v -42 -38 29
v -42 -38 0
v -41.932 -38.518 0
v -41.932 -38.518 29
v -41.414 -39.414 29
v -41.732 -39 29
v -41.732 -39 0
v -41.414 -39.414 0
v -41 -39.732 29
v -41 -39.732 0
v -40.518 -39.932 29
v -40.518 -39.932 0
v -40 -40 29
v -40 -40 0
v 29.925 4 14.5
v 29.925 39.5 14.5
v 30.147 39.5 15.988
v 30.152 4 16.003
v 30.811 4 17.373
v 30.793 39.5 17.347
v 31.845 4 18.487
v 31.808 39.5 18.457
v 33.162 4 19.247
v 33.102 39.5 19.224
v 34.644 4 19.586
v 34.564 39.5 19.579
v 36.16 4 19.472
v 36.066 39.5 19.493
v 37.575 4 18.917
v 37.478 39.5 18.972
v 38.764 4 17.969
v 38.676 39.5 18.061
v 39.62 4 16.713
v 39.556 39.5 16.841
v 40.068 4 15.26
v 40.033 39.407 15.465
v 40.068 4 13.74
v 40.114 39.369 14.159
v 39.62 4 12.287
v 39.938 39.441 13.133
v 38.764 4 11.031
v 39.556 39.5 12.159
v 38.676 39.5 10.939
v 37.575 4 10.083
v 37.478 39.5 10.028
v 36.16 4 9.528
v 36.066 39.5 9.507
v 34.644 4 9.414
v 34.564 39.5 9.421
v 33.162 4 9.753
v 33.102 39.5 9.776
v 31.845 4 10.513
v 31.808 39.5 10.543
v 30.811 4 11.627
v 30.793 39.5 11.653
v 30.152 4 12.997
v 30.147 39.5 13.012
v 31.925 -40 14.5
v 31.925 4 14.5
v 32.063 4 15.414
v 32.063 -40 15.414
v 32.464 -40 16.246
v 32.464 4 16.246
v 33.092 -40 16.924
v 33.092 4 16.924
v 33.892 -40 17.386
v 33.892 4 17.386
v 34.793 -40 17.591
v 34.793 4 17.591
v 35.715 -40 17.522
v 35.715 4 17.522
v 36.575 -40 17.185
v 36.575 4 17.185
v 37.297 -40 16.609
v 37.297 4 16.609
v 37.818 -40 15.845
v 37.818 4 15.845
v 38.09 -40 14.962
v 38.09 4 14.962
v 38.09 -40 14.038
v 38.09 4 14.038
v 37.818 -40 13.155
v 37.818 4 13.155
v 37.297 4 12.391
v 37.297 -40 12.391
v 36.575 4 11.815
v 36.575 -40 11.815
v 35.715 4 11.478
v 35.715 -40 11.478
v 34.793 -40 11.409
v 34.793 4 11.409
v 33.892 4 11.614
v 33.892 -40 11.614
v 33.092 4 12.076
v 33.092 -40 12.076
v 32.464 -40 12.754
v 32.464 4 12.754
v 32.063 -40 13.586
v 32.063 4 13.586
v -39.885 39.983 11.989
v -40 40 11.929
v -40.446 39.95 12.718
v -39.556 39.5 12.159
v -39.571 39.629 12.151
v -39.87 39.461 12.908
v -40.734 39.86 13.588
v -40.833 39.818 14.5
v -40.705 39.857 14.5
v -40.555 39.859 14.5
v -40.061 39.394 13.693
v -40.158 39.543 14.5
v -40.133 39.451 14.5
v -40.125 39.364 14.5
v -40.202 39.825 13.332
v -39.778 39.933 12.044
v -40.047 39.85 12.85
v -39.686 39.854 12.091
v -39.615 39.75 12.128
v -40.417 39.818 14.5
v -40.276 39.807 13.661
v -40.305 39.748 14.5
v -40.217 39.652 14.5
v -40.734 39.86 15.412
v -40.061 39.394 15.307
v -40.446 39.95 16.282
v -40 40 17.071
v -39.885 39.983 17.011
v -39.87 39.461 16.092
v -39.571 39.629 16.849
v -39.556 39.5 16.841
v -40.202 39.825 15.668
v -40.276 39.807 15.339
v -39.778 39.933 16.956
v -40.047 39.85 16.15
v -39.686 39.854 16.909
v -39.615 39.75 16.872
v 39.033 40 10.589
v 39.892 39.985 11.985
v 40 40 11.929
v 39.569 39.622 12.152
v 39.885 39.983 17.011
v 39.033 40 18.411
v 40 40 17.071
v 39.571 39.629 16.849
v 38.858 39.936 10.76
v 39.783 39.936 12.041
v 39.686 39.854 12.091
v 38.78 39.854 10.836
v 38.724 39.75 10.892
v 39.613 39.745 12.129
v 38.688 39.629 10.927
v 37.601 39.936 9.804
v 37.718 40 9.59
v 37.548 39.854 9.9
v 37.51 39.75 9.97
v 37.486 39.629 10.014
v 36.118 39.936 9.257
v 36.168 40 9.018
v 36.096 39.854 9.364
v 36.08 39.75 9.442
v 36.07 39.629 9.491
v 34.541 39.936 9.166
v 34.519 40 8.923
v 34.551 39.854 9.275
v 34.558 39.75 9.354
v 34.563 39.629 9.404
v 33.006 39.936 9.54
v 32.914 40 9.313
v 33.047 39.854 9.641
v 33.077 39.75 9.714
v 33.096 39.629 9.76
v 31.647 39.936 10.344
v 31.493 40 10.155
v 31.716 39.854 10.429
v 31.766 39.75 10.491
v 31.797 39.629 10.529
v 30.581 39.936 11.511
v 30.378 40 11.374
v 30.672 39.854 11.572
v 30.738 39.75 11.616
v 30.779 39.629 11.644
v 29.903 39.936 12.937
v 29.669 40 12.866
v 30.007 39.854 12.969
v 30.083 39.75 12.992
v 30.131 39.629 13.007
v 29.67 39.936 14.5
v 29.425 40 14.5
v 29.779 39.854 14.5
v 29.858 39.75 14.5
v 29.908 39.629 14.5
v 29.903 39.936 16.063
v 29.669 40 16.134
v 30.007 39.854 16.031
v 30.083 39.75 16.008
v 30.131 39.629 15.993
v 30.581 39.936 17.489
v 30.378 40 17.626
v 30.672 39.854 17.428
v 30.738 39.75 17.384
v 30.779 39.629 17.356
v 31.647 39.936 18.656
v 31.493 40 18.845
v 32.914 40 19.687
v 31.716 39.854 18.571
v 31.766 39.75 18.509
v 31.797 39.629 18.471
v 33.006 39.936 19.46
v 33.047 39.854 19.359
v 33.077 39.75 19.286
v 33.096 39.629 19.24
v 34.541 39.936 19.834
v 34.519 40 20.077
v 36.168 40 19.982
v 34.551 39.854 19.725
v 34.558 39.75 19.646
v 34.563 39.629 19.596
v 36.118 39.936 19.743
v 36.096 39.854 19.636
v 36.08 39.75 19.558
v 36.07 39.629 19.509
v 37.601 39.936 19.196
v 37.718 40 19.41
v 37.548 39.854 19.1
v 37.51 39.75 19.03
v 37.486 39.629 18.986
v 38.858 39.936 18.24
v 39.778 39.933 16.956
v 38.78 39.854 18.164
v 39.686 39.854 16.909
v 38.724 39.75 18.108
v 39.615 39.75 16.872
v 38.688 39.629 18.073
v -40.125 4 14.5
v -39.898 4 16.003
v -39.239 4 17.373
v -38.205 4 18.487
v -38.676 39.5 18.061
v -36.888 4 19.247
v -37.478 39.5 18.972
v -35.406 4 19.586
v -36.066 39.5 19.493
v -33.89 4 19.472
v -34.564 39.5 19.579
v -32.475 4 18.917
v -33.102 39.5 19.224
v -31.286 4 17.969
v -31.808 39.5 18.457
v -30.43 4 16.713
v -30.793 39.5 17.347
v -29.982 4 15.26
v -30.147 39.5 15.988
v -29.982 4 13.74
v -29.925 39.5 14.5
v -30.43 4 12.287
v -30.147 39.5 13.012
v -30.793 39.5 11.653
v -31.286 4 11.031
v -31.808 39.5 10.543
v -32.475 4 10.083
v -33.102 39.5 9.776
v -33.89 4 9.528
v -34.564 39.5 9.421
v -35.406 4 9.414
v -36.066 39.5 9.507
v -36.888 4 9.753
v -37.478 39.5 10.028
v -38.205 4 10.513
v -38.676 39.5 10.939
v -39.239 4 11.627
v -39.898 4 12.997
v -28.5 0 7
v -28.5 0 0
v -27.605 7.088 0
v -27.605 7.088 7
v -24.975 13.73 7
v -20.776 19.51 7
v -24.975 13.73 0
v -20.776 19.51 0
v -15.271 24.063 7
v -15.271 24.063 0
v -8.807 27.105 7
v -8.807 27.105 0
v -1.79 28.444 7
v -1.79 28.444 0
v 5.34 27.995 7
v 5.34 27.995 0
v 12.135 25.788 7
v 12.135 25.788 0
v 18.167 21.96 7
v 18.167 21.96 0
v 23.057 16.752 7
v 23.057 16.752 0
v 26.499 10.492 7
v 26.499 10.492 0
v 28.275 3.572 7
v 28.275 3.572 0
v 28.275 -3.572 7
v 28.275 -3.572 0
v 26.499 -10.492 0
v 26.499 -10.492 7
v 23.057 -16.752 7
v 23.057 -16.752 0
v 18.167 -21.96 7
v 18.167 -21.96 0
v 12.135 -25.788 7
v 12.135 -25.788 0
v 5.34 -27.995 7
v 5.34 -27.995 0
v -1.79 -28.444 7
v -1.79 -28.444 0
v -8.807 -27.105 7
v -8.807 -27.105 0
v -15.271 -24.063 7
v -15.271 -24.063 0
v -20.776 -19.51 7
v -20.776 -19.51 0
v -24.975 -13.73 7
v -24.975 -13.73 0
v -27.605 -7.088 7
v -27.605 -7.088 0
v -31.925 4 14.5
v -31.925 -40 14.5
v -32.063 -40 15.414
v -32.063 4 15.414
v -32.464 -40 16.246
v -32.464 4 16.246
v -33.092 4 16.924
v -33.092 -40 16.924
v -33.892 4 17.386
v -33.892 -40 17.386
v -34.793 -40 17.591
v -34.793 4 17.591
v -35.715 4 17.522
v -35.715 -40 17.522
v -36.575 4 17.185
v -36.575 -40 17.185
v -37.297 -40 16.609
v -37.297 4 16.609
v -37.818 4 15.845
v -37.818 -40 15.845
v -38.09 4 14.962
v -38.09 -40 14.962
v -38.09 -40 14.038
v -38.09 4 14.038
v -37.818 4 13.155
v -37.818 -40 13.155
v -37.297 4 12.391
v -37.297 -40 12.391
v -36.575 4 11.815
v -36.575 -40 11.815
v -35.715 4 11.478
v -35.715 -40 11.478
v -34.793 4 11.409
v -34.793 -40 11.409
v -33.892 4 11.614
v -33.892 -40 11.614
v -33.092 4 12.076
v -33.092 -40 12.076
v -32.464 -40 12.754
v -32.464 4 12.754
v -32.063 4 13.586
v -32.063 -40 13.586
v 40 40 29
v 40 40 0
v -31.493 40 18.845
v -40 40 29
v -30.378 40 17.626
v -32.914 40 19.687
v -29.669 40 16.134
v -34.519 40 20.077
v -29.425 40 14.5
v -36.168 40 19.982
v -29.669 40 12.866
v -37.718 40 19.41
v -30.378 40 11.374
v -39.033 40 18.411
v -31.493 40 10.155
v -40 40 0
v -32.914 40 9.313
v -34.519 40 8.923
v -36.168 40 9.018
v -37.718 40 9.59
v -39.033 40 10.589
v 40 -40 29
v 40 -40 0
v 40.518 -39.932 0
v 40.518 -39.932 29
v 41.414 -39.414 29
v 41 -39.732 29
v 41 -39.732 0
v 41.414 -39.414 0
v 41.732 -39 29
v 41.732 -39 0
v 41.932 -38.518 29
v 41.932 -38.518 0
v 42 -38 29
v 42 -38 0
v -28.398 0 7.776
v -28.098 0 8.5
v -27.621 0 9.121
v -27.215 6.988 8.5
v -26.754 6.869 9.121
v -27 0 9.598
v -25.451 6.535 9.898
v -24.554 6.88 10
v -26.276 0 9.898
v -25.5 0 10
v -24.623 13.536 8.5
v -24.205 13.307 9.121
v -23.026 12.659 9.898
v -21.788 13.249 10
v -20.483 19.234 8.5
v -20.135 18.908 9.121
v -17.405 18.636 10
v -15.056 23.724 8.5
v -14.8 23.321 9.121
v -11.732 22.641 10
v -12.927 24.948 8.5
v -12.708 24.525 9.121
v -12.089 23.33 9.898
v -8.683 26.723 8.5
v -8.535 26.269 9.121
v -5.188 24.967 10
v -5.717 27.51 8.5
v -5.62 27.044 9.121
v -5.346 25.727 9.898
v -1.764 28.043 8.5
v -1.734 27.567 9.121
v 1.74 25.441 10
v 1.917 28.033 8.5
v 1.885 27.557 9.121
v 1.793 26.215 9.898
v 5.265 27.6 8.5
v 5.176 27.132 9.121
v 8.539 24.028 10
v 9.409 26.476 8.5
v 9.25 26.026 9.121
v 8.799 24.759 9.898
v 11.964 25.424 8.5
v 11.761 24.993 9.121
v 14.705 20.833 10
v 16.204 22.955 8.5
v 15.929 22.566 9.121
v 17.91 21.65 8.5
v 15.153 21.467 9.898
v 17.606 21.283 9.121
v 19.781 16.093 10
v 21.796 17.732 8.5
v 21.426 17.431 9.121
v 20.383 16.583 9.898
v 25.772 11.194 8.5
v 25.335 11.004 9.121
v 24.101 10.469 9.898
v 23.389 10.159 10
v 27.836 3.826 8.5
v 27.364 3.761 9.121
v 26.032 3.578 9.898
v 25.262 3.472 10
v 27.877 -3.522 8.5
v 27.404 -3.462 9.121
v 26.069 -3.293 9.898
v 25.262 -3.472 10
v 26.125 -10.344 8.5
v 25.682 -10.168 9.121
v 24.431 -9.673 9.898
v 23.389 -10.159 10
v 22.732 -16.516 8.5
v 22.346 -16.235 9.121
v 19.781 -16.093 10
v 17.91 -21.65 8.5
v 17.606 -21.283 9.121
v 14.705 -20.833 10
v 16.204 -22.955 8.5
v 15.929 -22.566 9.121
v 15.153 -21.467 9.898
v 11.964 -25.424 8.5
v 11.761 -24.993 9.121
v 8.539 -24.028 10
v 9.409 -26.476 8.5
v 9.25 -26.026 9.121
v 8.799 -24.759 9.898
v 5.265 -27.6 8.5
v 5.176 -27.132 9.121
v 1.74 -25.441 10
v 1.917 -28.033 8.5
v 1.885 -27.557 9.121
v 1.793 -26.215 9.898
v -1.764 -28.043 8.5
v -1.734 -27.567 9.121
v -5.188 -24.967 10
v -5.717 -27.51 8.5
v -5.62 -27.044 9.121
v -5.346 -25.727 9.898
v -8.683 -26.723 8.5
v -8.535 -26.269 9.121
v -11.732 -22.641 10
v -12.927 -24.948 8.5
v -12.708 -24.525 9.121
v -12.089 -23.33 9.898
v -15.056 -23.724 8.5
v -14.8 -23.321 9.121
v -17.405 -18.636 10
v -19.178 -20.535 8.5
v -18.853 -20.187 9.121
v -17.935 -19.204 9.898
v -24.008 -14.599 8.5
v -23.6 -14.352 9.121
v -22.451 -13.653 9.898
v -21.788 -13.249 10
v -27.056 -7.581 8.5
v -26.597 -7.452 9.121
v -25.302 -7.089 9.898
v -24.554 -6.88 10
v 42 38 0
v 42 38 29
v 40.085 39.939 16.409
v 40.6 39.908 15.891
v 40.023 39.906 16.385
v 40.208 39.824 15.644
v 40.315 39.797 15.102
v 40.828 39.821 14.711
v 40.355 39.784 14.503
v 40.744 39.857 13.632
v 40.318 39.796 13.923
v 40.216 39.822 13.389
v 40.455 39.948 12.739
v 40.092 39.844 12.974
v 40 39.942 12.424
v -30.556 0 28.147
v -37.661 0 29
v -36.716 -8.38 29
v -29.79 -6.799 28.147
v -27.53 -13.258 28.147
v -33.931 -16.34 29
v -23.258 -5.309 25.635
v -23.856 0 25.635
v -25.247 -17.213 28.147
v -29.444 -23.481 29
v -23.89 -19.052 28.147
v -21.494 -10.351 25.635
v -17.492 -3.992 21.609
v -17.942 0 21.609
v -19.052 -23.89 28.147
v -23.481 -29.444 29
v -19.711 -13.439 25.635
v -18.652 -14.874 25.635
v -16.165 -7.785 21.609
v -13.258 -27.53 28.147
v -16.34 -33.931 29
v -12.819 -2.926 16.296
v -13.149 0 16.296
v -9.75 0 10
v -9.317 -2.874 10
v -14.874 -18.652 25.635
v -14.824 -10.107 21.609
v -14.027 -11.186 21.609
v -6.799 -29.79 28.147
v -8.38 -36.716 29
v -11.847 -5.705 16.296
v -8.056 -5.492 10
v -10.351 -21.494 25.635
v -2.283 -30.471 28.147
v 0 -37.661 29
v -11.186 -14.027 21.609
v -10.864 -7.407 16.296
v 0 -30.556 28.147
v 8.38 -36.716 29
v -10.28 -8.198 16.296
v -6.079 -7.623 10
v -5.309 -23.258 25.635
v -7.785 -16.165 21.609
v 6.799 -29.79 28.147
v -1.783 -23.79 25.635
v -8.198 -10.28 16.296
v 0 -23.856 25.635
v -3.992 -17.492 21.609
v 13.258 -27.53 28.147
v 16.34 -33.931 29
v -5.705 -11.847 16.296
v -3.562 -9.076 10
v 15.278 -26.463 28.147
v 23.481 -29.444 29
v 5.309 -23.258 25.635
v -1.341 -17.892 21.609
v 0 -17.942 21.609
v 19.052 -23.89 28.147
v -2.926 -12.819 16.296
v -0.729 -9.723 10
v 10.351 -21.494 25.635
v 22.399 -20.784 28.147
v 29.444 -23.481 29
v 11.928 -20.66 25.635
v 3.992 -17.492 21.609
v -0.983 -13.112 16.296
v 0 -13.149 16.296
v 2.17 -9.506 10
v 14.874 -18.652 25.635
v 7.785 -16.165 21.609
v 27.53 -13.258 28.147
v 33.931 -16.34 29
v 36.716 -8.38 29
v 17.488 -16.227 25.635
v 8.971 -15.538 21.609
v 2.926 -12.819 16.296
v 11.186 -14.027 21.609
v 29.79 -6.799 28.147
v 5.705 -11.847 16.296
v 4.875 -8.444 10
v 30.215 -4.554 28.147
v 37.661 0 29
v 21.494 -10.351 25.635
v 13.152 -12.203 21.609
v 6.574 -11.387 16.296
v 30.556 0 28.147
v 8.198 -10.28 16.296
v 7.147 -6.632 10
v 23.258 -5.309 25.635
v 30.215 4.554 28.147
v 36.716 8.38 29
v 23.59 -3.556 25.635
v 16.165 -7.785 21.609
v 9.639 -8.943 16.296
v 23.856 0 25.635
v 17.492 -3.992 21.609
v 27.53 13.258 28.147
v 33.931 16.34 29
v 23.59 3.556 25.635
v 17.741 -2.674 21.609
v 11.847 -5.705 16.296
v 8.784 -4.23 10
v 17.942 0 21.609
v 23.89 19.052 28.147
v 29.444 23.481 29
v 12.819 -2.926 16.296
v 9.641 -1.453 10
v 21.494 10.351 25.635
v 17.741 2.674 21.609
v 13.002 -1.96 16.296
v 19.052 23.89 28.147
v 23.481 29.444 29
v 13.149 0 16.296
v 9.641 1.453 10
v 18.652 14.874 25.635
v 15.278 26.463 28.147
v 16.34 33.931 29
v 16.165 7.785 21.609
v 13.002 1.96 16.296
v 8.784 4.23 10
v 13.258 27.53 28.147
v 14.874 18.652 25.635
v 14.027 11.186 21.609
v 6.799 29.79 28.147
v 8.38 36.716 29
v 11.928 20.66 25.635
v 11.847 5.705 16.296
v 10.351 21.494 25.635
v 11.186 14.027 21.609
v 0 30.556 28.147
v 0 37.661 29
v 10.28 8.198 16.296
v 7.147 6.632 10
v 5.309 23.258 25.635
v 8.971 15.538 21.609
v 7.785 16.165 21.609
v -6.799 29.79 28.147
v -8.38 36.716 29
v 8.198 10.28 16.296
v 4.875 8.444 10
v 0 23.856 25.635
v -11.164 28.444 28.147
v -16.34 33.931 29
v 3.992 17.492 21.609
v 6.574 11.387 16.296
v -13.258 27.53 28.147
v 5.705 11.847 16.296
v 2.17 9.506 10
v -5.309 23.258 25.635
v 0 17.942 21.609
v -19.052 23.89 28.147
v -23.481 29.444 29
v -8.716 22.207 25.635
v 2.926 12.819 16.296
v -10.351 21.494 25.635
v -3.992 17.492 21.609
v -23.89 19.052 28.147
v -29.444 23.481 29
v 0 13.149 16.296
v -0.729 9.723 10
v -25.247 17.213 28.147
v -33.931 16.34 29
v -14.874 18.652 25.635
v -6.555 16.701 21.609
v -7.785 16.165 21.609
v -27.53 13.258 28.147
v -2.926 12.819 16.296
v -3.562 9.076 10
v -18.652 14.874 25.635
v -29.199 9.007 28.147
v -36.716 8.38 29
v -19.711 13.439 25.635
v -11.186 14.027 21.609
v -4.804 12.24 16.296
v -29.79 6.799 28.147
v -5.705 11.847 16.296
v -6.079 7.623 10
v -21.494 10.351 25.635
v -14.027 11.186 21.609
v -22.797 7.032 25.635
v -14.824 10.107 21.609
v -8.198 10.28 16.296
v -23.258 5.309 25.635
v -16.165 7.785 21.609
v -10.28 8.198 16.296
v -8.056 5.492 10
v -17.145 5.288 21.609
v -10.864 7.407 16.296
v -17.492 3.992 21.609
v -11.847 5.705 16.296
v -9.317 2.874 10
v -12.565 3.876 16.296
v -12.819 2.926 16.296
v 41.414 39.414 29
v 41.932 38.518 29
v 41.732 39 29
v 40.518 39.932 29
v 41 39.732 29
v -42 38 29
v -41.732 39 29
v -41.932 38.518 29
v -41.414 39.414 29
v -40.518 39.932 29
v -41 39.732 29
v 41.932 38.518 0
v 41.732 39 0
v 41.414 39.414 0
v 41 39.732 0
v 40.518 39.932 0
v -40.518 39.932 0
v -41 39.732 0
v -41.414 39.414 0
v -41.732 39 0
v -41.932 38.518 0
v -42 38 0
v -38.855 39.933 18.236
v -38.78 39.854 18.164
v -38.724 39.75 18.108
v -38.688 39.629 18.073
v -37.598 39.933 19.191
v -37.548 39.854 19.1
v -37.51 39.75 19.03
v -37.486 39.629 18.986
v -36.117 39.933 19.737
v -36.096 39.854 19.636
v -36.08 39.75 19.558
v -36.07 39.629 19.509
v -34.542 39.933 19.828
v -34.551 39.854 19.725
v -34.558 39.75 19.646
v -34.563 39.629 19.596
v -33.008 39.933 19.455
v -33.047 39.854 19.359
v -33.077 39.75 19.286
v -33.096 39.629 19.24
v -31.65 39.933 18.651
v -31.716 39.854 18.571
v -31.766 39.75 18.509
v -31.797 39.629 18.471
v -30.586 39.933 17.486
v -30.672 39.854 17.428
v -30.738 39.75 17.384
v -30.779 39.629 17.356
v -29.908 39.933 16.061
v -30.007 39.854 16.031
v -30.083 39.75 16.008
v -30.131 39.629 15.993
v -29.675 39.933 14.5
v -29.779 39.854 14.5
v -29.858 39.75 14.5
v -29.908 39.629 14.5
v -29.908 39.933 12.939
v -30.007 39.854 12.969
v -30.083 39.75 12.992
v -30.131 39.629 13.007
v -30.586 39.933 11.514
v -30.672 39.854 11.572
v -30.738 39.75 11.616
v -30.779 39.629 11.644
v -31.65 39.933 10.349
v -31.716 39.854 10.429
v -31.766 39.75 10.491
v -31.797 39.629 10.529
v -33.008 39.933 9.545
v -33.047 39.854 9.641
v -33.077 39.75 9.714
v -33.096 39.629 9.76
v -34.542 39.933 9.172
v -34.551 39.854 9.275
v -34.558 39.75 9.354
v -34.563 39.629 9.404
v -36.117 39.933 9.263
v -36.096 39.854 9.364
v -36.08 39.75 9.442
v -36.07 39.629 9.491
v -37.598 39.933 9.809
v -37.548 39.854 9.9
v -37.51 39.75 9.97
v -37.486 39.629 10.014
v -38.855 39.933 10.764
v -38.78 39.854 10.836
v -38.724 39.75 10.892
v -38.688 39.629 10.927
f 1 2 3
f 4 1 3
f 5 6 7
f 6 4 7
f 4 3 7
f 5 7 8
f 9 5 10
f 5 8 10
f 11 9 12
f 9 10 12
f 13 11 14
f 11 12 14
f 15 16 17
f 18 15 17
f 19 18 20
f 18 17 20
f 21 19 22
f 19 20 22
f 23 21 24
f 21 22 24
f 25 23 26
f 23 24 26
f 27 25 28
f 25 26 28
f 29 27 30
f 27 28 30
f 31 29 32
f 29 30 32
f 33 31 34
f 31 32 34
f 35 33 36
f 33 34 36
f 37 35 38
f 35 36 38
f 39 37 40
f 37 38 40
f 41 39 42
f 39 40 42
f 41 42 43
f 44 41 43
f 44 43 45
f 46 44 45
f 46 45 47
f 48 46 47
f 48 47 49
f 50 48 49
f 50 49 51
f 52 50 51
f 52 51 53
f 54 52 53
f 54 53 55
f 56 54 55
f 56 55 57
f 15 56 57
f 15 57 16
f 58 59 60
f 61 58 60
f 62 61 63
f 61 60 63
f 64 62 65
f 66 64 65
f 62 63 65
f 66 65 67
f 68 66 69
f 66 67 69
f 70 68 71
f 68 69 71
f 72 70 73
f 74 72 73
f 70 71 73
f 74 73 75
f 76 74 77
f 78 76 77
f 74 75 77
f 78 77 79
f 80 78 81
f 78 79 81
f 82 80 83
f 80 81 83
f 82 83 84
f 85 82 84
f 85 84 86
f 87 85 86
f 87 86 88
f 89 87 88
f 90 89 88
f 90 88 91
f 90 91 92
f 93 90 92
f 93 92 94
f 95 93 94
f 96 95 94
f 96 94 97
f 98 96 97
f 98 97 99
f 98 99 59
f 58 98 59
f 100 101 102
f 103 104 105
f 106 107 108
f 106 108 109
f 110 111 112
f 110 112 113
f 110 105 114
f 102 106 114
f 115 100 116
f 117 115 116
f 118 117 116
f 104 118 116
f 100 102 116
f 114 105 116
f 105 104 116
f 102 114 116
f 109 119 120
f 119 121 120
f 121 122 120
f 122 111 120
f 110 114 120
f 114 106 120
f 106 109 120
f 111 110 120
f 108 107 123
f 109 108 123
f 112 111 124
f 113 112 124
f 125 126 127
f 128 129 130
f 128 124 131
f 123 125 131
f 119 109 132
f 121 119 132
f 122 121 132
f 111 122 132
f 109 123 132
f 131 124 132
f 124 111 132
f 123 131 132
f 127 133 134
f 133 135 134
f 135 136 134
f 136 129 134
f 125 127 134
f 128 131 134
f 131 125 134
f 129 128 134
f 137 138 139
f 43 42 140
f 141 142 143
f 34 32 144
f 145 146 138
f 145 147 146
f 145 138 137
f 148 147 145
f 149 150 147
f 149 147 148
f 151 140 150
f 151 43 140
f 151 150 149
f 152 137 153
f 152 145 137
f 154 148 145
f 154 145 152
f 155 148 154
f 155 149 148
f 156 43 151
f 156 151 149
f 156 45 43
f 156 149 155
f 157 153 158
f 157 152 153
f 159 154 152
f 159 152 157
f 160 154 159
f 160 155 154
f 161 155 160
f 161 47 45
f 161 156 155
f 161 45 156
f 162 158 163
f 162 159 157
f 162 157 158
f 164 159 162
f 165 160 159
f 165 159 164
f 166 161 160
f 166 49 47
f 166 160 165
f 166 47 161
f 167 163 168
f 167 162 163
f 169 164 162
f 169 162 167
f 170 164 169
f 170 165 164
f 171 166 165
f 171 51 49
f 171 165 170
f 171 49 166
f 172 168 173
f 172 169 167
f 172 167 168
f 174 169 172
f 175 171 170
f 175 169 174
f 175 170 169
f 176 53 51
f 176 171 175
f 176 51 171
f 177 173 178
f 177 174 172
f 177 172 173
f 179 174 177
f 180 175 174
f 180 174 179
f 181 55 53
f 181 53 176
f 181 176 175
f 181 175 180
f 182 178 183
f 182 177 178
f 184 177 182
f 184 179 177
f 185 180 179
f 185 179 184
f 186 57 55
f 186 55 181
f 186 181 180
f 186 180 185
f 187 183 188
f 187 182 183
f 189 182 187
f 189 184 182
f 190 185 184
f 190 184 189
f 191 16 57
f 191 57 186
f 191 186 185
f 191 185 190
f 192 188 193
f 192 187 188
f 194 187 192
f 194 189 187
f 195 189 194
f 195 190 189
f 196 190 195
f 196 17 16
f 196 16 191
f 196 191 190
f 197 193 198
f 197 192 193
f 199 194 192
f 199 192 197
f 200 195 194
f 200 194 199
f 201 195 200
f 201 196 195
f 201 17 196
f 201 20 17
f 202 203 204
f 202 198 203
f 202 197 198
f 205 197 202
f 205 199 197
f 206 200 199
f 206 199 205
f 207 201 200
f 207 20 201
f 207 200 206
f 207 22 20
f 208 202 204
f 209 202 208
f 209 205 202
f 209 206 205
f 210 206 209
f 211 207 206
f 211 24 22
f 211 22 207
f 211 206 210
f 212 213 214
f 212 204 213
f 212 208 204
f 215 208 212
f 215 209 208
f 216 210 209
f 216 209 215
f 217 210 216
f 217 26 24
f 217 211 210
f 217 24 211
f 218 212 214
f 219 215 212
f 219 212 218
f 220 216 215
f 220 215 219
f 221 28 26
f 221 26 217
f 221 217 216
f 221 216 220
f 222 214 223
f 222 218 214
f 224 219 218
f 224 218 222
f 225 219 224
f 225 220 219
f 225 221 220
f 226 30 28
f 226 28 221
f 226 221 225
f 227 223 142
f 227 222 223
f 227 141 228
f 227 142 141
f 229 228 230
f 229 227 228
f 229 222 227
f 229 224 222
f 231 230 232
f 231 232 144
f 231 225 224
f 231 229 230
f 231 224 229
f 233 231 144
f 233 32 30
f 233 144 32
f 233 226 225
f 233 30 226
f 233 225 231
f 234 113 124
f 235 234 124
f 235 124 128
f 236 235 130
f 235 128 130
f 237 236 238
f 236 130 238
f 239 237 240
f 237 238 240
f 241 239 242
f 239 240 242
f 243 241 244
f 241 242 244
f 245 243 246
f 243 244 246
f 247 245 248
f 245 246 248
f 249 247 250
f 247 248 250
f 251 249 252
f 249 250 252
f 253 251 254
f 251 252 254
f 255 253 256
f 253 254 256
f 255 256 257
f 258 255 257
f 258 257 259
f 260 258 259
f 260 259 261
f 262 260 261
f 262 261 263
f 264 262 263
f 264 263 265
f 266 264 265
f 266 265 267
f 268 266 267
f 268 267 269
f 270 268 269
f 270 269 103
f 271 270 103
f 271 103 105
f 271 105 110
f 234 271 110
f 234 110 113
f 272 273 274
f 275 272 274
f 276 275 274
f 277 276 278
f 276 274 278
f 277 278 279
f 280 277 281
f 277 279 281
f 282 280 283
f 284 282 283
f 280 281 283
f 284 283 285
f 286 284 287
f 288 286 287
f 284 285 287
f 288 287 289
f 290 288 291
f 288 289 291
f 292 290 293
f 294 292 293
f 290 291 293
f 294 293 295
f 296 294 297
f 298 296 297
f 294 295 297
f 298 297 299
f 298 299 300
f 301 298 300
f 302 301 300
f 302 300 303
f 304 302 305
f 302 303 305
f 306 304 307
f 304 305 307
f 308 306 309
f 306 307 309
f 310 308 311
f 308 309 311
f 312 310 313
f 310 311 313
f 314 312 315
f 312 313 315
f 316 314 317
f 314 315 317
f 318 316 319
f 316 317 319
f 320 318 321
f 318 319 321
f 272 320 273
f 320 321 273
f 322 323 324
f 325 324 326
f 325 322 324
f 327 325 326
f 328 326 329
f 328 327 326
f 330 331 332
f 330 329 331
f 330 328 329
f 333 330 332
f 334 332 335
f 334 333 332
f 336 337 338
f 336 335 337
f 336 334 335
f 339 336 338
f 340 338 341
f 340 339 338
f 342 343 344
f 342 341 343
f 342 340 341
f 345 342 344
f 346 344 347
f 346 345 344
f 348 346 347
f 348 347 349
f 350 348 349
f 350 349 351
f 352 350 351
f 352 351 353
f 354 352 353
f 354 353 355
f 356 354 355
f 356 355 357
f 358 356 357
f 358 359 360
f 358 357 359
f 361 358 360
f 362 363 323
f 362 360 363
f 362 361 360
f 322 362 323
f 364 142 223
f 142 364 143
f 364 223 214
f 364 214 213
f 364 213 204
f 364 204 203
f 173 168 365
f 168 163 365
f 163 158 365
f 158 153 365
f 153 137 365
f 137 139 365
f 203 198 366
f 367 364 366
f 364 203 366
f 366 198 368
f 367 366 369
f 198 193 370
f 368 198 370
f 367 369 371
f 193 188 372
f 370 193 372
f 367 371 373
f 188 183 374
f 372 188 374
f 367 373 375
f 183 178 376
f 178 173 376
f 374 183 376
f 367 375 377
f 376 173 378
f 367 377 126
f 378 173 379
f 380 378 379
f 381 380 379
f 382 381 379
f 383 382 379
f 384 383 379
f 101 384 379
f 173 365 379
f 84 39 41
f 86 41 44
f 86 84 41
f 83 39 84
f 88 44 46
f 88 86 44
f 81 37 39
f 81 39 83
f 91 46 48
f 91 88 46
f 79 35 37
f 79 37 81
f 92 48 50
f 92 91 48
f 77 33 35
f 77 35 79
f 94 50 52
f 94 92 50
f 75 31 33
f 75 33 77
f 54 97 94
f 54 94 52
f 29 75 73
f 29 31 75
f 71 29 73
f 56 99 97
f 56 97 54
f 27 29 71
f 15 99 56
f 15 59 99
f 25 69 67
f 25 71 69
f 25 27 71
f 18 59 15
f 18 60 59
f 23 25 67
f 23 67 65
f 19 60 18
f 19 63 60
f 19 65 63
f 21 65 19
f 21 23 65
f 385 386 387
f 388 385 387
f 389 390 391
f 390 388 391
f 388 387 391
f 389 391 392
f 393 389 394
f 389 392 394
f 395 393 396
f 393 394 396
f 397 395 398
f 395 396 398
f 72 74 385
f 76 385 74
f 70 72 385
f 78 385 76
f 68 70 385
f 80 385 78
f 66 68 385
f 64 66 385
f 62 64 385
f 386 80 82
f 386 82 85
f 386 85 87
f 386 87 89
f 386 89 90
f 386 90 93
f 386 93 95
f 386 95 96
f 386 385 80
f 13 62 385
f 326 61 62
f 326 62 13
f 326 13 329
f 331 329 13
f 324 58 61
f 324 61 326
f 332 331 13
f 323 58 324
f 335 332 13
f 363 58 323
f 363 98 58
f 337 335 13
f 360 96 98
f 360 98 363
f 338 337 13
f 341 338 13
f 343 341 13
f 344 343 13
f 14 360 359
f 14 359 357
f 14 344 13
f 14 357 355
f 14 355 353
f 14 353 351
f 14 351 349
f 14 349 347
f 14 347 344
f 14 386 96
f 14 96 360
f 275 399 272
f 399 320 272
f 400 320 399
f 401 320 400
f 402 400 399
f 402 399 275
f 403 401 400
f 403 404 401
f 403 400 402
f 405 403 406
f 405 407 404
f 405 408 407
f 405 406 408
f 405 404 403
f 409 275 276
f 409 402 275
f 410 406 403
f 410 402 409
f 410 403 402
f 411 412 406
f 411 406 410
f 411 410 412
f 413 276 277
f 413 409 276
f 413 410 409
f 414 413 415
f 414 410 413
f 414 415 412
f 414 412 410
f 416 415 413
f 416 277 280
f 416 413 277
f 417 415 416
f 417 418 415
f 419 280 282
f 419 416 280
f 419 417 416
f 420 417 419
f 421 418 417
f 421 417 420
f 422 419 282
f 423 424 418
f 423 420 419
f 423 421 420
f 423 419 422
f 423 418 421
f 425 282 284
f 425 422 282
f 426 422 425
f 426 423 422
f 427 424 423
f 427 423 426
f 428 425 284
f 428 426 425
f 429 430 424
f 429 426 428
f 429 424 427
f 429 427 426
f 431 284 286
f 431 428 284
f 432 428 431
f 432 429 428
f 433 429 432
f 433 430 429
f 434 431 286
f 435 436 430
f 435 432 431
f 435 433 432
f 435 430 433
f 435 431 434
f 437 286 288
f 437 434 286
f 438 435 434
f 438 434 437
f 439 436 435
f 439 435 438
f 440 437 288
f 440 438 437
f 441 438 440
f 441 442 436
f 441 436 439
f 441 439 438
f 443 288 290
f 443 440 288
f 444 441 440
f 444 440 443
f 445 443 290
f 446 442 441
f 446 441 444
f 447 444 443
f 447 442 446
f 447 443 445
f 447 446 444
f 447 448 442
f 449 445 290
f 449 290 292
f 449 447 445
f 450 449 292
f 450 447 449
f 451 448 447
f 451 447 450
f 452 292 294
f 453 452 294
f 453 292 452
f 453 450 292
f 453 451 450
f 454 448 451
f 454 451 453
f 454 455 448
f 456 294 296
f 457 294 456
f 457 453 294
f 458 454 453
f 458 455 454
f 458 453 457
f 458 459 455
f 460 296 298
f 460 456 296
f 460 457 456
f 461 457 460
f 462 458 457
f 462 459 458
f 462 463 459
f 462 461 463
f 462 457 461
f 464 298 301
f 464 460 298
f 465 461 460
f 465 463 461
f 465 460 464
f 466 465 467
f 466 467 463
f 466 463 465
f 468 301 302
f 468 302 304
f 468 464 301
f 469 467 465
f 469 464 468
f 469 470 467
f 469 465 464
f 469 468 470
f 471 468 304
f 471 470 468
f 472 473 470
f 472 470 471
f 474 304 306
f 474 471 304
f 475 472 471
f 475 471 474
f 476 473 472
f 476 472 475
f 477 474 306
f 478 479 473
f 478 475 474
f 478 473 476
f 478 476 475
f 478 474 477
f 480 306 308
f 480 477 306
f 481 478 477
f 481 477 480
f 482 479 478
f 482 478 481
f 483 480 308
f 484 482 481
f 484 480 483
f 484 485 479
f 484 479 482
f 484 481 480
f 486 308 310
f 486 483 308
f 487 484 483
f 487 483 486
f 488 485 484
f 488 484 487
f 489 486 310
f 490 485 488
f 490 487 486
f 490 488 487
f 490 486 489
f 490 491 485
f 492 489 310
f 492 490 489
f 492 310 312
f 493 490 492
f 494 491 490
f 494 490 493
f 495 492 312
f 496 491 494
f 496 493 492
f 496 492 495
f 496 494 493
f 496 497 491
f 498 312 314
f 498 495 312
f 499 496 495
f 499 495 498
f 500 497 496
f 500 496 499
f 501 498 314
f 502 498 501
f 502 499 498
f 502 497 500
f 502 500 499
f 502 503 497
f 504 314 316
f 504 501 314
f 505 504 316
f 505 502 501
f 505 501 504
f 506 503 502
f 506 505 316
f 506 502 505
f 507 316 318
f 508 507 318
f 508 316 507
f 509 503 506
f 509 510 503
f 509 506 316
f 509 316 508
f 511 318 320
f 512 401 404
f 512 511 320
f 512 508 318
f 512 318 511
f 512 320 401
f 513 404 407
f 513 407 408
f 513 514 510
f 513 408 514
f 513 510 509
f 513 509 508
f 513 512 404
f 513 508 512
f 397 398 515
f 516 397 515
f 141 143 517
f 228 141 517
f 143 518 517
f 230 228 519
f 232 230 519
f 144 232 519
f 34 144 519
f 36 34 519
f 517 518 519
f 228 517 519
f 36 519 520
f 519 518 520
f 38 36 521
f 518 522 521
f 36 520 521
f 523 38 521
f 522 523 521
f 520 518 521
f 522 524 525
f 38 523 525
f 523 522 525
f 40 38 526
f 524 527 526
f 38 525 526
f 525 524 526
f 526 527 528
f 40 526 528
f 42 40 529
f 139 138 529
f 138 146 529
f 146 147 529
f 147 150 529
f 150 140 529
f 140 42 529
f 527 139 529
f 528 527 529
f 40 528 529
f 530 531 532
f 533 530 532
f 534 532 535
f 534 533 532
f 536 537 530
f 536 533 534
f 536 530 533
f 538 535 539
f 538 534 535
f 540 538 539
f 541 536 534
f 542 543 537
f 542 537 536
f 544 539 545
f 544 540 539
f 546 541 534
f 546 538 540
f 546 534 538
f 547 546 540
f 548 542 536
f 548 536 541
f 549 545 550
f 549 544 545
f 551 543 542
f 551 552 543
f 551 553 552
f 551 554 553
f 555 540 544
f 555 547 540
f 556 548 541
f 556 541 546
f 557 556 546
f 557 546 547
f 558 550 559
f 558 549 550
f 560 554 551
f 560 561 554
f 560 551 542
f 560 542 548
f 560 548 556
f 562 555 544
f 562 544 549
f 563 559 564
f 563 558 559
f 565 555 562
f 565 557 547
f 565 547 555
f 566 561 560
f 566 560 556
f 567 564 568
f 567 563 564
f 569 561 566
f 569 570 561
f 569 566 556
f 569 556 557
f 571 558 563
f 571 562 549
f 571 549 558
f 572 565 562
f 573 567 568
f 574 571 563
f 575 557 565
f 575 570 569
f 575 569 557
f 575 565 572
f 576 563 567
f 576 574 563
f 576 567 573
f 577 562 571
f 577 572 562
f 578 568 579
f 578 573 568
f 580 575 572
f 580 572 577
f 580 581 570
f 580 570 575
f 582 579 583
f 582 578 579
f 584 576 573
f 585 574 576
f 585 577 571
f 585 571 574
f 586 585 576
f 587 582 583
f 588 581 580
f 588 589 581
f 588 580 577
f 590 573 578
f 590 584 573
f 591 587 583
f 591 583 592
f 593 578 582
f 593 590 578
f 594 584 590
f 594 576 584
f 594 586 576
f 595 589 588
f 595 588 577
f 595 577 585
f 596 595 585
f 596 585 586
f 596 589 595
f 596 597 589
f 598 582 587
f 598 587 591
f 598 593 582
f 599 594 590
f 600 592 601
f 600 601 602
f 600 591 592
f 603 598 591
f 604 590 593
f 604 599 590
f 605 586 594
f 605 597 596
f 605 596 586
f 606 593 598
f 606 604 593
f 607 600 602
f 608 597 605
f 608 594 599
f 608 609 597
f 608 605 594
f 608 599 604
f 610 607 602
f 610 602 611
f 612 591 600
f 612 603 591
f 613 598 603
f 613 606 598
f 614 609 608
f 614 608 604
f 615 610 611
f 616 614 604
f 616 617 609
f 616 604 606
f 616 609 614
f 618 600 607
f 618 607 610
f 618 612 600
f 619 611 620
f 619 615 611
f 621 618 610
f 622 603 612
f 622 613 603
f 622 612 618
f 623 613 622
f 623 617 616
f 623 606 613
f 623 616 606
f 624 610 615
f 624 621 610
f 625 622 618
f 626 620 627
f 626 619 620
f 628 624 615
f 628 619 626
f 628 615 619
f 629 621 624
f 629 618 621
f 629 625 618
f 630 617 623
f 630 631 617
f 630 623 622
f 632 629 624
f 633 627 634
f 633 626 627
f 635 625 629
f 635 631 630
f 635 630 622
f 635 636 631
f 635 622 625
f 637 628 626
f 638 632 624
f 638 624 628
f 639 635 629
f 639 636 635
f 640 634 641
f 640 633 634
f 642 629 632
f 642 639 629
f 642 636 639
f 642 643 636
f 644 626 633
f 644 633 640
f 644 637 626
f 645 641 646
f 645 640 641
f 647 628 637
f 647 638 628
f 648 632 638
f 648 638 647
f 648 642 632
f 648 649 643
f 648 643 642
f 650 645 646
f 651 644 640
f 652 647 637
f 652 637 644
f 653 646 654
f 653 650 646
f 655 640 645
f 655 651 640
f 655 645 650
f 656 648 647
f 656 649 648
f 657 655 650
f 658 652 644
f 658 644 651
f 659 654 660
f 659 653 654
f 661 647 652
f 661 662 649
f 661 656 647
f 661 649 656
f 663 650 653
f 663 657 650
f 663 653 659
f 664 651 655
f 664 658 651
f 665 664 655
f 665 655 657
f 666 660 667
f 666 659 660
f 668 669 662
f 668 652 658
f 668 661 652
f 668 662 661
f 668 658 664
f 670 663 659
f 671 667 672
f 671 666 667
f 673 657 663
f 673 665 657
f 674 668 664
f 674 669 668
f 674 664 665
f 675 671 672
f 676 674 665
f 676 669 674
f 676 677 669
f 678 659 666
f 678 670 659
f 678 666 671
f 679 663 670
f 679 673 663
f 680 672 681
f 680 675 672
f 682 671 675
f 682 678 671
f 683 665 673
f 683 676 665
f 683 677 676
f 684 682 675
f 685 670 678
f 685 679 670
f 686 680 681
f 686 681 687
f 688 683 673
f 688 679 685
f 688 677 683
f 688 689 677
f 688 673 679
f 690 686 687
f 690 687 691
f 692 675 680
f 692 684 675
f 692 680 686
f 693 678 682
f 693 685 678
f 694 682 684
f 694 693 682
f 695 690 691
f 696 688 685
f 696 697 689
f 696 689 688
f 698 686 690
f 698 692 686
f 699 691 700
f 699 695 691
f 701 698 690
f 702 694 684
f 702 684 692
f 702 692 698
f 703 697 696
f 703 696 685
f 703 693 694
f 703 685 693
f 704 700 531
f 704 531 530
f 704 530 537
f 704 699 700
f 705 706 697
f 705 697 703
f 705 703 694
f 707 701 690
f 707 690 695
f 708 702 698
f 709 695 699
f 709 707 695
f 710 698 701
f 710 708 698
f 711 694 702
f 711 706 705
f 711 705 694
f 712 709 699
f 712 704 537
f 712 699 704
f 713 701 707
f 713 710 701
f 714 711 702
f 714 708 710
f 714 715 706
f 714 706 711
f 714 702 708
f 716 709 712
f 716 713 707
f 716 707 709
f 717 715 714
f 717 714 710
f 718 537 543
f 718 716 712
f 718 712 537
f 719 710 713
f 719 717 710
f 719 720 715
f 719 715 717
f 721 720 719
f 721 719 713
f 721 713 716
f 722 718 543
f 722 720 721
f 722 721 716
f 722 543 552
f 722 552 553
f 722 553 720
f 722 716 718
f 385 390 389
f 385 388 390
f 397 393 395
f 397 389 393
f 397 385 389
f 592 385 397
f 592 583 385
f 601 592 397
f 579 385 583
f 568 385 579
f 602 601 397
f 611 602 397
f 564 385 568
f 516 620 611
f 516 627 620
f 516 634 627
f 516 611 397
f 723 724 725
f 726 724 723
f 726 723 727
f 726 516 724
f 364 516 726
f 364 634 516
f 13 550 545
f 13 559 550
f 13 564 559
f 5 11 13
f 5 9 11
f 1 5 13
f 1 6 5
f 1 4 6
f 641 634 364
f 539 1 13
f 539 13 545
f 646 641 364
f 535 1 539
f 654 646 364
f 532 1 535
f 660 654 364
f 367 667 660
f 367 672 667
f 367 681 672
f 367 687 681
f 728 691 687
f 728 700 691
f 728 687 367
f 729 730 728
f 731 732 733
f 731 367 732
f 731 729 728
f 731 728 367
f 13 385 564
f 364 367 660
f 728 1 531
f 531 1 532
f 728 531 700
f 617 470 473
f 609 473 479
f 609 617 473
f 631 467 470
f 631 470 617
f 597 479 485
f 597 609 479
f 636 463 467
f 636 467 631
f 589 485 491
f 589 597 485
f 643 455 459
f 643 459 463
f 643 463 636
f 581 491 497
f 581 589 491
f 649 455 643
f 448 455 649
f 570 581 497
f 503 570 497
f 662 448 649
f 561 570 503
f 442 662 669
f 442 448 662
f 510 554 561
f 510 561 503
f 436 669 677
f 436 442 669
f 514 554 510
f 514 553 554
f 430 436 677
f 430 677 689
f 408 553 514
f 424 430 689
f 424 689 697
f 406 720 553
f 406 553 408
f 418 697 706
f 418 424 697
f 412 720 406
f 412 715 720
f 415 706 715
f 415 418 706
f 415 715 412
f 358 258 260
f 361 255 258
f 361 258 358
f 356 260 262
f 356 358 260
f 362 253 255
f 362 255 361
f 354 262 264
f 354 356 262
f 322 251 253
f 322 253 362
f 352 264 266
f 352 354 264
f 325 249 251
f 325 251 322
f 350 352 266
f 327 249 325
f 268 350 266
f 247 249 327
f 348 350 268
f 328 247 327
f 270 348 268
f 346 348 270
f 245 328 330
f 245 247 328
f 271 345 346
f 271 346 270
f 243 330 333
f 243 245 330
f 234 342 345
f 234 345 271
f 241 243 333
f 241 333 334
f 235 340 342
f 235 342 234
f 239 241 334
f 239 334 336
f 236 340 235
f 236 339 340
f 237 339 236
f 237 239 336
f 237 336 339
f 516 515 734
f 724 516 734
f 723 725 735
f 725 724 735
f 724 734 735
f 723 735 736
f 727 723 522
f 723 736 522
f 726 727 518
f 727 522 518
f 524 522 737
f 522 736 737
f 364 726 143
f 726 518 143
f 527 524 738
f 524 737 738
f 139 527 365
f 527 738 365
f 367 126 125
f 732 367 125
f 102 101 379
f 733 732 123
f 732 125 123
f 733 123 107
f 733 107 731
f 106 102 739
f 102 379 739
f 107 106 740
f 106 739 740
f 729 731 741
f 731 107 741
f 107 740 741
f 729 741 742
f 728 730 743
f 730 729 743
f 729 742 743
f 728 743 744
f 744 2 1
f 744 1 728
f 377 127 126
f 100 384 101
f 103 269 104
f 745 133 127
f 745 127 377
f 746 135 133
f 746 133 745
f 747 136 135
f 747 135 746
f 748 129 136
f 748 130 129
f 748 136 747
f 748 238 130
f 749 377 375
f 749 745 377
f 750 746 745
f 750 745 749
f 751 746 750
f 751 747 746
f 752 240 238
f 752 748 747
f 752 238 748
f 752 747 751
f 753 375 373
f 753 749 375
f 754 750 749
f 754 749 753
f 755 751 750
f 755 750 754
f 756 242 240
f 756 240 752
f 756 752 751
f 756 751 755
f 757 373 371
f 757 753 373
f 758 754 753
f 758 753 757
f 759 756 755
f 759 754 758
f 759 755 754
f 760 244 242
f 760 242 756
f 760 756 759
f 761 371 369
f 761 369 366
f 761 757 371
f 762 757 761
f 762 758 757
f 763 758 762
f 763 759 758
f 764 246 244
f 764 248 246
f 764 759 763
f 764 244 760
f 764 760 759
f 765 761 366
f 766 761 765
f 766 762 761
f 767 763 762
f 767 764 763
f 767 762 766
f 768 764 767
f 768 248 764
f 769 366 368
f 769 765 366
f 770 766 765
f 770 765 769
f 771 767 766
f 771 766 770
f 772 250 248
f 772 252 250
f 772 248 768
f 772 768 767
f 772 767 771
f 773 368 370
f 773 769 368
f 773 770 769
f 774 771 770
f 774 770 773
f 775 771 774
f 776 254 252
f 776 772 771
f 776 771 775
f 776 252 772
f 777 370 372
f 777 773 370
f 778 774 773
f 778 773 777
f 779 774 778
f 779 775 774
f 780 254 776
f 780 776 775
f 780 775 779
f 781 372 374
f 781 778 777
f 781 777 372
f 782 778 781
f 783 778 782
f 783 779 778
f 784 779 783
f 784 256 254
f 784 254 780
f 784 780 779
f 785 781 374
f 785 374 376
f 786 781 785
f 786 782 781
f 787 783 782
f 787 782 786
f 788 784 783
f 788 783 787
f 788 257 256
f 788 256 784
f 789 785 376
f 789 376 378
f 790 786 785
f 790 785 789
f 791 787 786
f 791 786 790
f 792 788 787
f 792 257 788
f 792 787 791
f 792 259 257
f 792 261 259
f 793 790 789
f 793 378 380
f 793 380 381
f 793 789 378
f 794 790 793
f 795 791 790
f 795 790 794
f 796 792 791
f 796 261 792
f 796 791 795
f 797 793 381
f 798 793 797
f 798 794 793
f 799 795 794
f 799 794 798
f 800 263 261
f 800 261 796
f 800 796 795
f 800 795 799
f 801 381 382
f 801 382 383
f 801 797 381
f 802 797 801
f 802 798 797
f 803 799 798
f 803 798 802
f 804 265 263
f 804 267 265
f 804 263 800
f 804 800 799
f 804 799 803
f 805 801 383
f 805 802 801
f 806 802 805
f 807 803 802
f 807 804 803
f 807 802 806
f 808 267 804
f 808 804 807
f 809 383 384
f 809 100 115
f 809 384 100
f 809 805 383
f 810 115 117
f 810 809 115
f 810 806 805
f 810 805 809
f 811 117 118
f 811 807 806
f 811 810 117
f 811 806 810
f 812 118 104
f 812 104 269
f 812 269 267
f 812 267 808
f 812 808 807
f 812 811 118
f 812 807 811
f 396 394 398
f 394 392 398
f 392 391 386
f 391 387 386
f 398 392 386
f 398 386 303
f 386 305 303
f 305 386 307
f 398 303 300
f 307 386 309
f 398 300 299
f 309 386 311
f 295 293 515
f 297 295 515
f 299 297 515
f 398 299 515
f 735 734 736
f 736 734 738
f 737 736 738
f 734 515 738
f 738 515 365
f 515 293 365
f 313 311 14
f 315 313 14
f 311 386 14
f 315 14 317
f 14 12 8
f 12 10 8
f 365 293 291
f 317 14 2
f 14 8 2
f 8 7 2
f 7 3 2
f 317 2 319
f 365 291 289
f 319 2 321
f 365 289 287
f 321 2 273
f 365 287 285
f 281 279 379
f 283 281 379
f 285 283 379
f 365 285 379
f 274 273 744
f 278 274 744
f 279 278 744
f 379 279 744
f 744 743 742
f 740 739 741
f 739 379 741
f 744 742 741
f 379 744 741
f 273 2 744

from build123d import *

# Parameters (mm, degrees)
SKETCH1_W                    = 80
SKETCH1_H                    = 84
SKETCH1_R                    = 9.75
F_29_MM_EXTRUDE_DEPTH        = 29
SKETCH2_R                    = 28.5
F_7_MM_CUT_DEPTH             = 10
F_30R_FUNNEL_SLOPE_R         = 30
SKETCH3_R                    = 5.1
F_36_MM_CUT_SCREW_HEAD_DEPTH = 36
SKETCH5_R                    = 3.1
F_7_8MM_BORE_DEPTH           = 95.89467846
F_3R_PIG_HOLE_R              = 3
F_2R_CORNERS_R               = 2
F_0_5R_BOLTS_R               = 0.5


with BuildPart() as part:
    # Sketch1 → 29 mm extrude (new body)
    with BuildSketch(Plane(origin=(0, 0, 0), x_dir=(0, 1, 0), z_dir=(0, 0, 1))):
        Rectangle(SKETCH1_W, SKETCH1_H)
        with Locations(Location((0, 0, 0), (0, 0, 90))):
            Circle(SKETCH1_R, mode=Mode.SUBTRACT)
    extrude(amount=F_29_MM_EXTRUDE_DEPTH)

    # Sketch2 → 7 mm cut (cut)
    with BuildSketch(Plane(origin=(0, 0, 0), x_dir=(1, 0, 0), z_dir=(0, 0, -1))):
        with Locations(Location((0, 0, 0), (0, 0, 180))):
            Circle(SKETCH2_R)
    extrude(amount=-F_7_MM_CUT_DEPTH, mode=Mode.SUBTRACT)

    # 30R funnel slope
    # the kernel refuses this fillet: 30 mm, written as the material it takes off along each edge
    with BuildSketch(Plane(origin=(0, 0, 29), x_dir=(-1, 0, 0), z_dir=(0, 1, 0))) as f_30r_funnel_slope_piece_1:
        with BuildLine():
            CenterArc((37.660571474, -30), F_30R_FUNNEL_SLOPE_R, 90, 68.489811733)
            Line((9.75, -19), (9.191788571, -18.78))
            ThreePointArc((9.191788571, -18.78), (9.15, -9.5), (9.15, 0))
            Line((9.15, 0), (9.75, 0.6))
            Line((9.75, 0.6), (37.660571474, 0.6))
            Line((37.660571474, 0.6), (37.660571474, 0))
        make_face()
    revolve(axis=Axis((0, 0, 29), (0, 0, 1)), mode=Mode.SUBTRACT)

    # Sketch3 → 36 mm cut screw head (cut)
    with BuildSketch(Plane(origin=(0, 40, 0), x_dir=(-1, 0, 0), z_dir=(0, 1, 0))):
        with Locations((-35.025, 14.5)):
            Circle(SKETCH3_R)
        with Locations((35.025, 14.5)):
            Circle(SKETCH3_R)
    extrude(amount=-F_36_MM_CUT_SCREW_HEAD_DEPTH, mode=Mode.SUBTRACT)

    # Sketch5 → 7.8mm bore (cut, through all)
    with BuildSketch(Plane(origin=(0, 40, 0), x_dir=(-1, 0, 0), z_dir=(0, 1, 0))):
        with Locations((-35.025, 14.5)):
            Circle(SKETCH5_R)
    f_7_8mm_bore = extrude(amount=-F_7_8MM_BORE_DEPTH, mode=Mode.SUBTRACT)

    # 3R pig hole
    f_3r_pig_hole_edges = [part.edges().sort_by_distance(p)[0] for p in [
        (28.5, 0, 10),
    ]]
    fillet(f_3r_pig_hole_edges, radius=F_3R_PIG_HOLE_R)

    # 2R corners
    # the kernel refuses this fillet: 2 mm, written as the material it takes off along each edge
    with BuildSketch(Plane(origin=(42, 40, -5), x_dir=(0, -1, 0), z_dir=(0, 0, 1)), Plane(origin=(-42, 40, -5), x_dir=(1, 0, 0), z_dir=(0, 0, 1))) as f_2r_corners_piece_1:
        with BuildLine():
            CenterArc((F_2R_CORNERS_R, -F_2R_CORNERS_R), F_2R_CORNERS_R, 90, 90)
            Line((0, -F_2R_CORNERS_R), (0, 0))
            Line((0, 0), (F_2R_CORNERS_R, 0))
        make_face()
    extrude(amount=39, mode=Mode.SUBTRACT)
    with BuildSketch(Plane(origin=(42, -40, -5), x_dir=(0, 1, 0), z_dir=(0, 0, 1)), Plane(origin=(-42, -40, -5), x_dir=(1, 0, 0), z_dir=(0, 0, 1))) as f_2r_corners_piece_2:
        with BuildLine():
            CenterArc((F_2R_CORNERS_R, F_2R_CORNERS_R), F_2R_CORNERS_R, 180, 90)
            Line((0, F_2R_CORNERS_R), (0, 0))
            Line((0, 0), (F_2R_CORNERS_R, 0))
        make_face()
    extrude(amount=39, mode=Mode.SUBTRACT)

    # 0.5R bolts
    f_0_5r_bolts_edges = [part.edges().sort_by_distance(p)[0] for p in [
        (-29.925, 40, 14.5),
        (34.46042051, 40, 19.568653667),
        (-40.093653599, 39.997806015, 15.064580313),
        (40.125, 39.996089928, 14.5),
    ]]
    fillet(f_0_5r_bolts_edges, radius=F_0_5R_BOLTS_R)

    # Mirror1: 7.8mm bore across plane
    add(f_7_8mm_bore.mirror(Plane(origin=(0, 0, 0), x_dir=(0, 0, 1), z_dir=(1, 0, 0))), mode=Mode.SUBTRACT)


solid = part.part
